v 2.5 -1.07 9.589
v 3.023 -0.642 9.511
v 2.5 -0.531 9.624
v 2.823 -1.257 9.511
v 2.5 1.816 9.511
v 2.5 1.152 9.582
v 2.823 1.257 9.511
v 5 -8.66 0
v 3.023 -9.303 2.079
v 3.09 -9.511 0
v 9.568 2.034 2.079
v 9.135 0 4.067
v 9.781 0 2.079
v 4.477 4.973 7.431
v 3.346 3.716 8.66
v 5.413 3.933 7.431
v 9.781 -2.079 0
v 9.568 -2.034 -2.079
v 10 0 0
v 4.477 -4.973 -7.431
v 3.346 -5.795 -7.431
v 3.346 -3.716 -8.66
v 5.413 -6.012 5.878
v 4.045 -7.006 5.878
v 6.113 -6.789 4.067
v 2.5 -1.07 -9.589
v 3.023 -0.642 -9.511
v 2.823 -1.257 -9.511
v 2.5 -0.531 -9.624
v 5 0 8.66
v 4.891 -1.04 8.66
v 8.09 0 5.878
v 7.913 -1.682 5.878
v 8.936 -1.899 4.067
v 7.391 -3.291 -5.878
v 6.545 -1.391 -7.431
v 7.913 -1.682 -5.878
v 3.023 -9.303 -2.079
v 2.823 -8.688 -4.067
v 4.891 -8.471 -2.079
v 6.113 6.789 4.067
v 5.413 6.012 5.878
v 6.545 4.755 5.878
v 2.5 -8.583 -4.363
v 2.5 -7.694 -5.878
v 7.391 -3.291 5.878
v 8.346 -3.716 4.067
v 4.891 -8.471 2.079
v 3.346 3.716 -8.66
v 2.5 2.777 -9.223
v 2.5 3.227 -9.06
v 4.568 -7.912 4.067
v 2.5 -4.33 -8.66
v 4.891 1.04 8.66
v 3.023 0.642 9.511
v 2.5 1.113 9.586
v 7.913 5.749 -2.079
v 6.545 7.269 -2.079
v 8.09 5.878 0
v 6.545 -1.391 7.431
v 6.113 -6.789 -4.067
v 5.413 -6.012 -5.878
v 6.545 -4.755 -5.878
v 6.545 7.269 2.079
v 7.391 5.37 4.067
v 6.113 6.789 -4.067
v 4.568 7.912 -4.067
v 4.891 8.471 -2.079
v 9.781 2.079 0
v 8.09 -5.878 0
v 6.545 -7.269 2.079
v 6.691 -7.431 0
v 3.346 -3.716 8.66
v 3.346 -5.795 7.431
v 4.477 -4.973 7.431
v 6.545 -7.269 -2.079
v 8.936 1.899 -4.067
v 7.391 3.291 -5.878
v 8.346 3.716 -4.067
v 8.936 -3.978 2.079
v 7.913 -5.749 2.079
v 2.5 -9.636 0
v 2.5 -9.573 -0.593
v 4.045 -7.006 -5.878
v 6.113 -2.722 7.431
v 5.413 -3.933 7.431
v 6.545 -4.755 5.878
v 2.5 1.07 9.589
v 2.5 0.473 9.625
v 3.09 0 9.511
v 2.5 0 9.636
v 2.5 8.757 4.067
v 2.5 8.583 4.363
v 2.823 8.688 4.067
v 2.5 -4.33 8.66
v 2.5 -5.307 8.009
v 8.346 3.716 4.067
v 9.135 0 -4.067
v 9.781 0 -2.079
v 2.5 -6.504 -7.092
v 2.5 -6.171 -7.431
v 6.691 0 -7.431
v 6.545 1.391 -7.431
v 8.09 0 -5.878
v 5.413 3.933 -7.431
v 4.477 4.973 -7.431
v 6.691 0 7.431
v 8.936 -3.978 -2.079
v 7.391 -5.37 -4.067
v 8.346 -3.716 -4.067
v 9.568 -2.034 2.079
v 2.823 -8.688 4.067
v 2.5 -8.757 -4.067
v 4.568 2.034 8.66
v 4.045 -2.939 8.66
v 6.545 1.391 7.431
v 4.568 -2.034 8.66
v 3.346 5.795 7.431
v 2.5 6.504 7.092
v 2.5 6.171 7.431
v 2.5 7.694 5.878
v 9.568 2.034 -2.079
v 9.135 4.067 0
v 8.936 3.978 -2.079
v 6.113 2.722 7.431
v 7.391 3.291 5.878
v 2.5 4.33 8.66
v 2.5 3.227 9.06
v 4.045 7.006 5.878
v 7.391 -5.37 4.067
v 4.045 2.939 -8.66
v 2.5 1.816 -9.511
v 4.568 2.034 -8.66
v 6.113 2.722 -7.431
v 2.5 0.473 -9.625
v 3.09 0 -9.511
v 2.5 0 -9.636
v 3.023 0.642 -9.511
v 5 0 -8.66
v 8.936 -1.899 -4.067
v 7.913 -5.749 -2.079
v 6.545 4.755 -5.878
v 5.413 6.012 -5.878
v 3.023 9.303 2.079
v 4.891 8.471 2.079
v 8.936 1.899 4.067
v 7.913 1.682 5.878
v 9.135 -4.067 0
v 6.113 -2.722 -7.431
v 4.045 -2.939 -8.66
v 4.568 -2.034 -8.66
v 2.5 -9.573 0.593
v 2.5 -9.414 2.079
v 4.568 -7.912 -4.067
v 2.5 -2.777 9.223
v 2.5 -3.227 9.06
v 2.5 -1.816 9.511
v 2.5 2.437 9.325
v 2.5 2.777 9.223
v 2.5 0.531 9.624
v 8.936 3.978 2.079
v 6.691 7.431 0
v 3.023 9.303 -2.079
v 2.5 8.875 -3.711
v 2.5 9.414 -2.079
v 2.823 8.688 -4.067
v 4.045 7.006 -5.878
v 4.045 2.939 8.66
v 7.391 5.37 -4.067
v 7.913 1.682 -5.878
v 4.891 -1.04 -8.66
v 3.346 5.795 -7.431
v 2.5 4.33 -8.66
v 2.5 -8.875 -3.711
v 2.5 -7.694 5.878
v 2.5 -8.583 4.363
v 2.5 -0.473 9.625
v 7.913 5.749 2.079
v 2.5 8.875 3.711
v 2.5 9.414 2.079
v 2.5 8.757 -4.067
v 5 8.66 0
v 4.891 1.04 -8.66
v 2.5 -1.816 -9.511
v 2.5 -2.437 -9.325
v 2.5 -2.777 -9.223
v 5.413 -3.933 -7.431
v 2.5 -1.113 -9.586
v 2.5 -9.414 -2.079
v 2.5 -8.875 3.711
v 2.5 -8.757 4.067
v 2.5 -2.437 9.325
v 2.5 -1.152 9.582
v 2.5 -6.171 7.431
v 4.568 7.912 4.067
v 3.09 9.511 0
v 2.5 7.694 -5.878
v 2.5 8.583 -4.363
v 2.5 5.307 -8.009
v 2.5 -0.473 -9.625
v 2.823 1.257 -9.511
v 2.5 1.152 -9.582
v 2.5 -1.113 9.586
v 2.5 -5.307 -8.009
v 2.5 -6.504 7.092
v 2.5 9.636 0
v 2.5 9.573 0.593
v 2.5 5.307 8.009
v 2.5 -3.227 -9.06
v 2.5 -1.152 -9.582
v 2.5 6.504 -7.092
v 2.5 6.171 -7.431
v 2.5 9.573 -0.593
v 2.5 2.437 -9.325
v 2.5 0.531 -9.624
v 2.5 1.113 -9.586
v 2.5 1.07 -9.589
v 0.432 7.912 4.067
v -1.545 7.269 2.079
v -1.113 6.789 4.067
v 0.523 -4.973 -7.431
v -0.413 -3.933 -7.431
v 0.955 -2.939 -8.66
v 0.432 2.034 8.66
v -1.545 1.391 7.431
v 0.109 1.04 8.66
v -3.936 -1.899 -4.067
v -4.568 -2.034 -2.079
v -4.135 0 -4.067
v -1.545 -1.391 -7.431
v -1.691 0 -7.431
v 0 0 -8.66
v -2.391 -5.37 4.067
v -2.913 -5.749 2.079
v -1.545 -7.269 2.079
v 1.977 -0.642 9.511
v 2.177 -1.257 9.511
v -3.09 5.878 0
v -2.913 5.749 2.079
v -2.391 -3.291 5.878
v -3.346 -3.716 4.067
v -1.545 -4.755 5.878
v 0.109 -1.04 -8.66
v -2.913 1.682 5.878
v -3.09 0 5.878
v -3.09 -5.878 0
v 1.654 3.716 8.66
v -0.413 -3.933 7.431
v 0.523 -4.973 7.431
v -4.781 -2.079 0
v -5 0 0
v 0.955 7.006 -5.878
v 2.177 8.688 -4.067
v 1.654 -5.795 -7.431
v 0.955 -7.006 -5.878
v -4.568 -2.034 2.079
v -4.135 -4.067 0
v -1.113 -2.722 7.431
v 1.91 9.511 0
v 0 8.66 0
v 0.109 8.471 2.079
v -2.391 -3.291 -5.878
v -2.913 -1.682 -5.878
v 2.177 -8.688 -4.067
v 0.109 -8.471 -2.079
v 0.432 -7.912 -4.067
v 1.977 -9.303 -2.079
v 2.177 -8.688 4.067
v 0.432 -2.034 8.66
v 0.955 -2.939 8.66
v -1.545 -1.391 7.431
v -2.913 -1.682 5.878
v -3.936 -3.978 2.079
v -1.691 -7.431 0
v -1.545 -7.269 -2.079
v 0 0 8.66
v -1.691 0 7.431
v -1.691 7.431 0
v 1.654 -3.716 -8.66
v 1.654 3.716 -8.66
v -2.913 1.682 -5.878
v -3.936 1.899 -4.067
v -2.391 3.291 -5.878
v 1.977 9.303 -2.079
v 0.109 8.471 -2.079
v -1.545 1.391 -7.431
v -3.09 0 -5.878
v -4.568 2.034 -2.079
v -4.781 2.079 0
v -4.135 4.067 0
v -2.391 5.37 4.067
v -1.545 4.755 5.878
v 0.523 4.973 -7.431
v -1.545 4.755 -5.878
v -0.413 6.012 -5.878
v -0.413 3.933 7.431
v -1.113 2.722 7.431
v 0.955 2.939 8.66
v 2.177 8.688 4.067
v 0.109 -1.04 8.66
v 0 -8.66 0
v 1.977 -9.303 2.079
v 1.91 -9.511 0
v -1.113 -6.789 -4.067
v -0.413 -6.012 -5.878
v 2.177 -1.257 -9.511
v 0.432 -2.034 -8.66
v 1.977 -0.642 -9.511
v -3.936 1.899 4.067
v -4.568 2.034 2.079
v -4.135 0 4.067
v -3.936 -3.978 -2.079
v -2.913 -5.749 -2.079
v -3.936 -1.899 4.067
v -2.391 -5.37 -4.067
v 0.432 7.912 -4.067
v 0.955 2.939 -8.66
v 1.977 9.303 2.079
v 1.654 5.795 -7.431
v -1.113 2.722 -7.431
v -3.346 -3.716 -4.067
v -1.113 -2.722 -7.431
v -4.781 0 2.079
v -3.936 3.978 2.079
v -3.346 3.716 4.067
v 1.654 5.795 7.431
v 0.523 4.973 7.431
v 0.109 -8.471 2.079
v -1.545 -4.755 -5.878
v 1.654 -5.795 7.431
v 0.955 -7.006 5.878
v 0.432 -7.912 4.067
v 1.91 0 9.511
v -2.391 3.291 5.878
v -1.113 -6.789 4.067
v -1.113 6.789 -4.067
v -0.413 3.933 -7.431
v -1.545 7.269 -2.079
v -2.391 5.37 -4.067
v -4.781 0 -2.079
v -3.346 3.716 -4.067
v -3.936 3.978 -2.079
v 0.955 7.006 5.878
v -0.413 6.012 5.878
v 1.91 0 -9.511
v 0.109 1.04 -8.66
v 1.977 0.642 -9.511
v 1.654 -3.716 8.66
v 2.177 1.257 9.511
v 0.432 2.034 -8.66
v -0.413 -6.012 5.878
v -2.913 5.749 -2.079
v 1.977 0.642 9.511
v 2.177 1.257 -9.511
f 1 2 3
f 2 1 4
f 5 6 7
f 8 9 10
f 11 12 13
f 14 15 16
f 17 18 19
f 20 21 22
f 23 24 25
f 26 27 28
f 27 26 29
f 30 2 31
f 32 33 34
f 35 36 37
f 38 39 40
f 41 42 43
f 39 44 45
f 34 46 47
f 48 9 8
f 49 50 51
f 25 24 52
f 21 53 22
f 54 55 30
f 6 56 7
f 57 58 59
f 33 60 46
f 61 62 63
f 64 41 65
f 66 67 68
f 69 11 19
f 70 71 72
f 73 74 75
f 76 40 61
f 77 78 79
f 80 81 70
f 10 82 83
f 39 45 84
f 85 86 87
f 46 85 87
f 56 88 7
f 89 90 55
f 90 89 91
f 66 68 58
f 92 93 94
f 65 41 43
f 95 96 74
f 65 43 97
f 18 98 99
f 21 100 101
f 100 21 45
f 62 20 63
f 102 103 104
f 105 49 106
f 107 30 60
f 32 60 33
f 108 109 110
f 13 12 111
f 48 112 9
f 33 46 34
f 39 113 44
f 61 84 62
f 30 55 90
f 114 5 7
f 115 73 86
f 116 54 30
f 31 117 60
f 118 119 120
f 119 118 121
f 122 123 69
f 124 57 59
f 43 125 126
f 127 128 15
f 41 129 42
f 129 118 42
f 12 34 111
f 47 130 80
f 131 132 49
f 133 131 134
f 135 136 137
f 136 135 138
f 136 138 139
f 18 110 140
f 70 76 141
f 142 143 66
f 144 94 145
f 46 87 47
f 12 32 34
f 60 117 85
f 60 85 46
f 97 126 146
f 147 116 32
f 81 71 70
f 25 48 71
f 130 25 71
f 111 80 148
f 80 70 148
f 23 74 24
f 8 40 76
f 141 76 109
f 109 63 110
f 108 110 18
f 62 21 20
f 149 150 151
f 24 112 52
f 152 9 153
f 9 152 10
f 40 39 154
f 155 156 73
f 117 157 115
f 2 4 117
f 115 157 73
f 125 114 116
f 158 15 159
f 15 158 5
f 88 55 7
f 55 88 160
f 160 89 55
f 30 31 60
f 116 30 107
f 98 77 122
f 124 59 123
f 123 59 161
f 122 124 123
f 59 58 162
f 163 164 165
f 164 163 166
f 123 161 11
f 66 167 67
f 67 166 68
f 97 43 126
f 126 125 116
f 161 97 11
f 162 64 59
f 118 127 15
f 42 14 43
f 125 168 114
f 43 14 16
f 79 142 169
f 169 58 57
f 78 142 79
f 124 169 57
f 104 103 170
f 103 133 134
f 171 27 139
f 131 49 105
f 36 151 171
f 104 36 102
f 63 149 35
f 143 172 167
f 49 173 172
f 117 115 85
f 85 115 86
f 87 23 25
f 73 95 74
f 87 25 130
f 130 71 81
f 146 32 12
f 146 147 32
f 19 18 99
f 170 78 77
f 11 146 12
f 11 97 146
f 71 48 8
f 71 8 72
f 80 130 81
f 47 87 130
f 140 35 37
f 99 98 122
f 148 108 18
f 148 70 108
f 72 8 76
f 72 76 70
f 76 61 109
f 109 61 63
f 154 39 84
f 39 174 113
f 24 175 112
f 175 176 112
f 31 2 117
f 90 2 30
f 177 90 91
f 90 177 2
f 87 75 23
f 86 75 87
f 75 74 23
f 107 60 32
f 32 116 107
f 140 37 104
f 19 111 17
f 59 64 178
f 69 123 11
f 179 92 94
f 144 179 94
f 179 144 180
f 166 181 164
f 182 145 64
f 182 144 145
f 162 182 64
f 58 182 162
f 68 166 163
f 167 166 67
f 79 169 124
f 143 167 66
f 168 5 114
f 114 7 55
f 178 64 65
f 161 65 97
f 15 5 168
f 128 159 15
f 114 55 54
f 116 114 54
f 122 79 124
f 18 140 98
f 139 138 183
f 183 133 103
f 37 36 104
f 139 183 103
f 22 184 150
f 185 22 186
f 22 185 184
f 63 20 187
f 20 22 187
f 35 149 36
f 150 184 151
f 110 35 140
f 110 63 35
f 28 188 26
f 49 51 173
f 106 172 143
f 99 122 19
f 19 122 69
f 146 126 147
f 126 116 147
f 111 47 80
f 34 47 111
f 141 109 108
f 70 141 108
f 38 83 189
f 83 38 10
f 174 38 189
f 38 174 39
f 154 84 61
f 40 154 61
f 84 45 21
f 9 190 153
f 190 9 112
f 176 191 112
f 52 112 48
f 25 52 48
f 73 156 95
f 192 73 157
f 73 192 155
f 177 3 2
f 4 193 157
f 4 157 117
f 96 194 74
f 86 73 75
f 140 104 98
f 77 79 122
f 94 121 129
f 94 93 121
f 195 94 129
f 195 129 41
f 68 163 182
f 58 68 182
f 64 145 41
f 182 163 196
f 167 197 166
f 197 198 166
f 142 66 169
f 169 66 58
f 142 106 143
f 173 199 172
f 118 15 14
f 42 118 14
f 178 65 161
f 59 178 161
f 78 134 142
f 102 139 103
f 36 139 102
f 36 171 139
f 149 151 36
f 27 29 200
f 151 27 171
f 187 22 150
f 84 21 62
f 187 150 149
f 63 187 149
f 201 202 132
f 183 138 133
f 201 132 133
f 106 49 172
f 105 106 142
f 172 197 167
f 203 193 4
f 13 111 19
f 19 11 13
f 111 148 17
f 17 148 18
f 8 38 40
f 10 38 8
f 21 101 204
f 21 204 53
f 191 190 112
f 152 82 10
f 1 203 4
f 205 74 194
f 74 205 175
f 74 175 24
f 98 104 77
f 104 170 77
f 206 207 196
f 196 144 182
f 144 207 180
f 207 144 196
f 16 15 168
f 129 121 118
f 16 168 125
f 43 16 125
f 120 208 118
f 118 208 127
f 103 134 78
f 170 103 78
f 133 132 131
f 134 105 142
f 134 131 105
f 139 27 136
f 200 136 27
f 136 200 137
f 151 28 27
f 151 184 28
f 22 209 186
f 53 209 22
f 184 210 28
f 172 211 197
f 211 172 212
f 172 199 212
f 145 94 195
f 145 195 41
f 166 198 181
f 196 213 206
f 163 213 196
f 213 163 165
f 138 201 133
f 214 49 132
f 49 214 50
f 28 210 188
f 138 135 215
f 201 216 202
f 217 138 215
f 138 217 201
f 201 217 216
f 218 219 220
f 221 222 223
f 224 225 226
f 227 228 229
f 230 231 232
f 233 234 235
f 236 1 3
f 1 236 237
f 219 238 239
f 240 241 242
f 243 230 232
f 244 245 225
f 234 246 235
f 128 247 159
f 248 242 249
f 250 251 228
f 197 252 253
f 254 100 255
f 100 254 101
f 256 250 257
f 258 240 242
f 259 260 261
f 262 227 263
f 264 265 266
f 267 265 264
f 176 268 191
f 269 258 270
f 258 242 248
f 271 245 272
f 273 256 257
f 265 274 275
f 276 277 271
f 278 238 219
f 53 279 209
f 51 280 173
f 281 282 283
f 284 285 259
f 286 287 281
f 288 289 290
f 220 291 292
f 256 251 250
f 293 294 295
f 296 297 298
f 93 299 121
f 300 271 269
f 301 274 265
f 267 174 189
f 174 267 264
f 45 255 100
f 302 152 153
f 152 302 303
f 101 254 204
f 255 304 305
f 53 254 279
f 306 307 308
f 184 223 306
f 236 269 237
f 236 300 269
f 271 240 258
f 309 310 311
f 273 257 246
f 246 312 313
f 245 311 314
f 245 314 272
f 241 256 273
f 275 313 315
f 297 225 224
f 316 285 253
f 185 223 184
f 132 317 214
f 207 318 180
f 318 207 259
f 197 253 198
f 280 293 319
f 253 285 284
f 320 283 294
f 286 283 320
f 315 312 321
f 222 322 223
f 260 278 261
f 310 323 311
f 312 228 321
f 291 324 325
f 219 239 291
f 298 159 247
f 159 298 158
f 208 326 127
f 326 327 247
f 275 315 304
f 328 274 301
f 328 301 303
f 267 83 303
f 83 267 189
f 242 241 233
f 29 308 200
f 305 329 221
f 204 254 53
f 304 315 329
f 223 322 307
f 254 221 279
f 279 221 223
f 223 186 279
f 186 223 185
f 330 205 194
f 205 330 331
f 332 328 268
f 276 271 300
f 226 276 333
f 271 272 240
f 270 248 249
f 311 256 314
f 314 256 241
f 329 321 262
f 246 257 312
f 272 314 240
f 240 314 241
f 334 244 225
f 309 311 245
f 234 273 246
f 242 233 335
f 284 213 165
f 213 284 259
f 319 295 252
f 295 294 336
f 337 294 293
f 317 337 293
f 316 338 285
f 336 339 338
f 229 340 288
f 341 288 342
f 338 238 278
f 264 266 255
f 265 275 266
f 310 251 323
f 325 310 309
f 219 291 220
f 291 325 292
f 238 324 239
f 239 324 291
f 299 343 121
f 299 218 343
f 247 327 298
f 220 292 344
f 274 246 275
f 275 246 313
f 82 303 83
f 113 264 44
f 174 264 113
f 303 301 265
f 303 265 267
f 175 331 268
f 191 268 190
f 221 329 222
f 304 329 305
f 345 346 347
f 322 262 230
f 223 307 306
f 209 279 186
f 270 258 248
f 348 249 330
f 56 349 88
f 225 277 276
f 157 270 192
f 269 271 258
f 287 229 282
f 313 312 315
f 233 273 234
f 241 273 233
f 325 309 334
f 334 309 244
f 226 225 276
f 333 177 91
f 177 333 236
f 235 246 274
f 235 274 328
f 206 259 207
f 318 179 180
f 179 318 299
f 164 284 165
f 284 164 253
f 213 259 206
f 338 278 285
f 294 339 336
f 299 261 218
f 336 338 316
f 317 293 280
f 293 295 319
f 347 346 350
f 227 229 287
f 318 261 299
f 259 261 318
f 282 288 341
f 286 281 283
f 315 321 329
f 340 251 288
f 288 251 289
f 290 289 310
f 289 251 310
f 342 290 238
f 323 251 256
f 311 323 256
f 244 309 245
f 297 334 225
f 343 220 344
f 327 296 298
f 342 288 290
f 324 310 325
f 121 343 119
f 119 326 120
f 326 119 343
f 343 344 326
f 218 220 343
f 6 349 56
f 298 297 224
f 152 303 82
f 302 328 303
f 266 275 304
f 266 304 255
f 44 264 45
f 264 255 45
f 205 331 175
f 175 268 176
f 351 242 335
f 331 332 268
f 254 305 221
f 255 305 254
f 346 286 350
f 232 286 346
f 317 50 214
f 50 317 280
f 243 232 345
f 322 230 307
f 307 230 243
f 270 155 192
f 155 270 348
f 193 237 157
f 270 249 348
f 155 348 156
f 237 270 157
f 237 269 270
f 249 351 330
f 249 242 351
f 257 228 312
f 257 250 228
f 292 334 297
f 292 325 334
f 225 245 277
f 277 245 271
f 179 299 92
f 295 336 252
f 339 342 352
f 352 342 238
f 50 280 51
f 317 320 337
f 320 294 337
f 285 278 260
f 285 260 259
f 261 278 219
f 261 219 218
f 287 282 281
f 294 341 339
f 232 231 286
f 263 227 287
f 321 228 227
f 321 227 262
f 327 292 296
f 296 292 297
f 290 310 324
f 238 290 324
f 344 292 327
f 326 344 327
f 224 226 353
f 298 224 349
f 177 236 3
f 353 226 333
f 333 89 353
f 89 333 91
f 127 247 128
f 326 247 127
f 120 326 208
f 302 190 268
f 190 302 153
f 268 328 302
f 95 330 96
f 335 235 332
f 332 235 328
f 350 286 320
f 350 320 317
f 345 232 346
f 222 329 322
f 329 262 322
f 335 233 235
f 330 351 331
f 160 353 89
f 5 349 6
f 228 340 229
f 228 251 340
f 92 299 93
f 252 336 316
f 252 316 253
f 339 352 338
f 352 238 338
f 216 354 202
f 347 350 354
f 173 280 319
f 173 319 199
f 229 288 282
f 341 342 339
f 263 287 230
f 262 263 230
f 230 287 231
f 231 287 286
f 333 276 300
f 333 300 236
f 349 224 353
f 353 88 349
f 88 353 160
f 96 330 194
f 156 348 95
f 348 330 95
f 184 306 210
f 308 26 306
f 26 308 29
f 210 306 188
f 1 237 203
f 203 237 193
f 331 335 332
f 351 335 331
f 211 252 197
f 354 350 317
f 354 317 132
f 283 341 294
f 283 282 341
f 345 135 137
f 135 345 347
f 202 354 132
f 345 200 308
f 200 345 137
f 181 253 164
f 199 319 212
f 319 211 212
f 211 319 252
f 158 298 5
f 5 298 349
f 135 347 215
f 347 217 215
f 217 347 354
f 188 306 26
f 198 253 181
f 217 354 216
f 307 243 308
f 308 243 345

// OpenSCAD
intersection(){
    sphere(r = 10);
    translate([5, 0, 0,])sphere(r = 10);
}
